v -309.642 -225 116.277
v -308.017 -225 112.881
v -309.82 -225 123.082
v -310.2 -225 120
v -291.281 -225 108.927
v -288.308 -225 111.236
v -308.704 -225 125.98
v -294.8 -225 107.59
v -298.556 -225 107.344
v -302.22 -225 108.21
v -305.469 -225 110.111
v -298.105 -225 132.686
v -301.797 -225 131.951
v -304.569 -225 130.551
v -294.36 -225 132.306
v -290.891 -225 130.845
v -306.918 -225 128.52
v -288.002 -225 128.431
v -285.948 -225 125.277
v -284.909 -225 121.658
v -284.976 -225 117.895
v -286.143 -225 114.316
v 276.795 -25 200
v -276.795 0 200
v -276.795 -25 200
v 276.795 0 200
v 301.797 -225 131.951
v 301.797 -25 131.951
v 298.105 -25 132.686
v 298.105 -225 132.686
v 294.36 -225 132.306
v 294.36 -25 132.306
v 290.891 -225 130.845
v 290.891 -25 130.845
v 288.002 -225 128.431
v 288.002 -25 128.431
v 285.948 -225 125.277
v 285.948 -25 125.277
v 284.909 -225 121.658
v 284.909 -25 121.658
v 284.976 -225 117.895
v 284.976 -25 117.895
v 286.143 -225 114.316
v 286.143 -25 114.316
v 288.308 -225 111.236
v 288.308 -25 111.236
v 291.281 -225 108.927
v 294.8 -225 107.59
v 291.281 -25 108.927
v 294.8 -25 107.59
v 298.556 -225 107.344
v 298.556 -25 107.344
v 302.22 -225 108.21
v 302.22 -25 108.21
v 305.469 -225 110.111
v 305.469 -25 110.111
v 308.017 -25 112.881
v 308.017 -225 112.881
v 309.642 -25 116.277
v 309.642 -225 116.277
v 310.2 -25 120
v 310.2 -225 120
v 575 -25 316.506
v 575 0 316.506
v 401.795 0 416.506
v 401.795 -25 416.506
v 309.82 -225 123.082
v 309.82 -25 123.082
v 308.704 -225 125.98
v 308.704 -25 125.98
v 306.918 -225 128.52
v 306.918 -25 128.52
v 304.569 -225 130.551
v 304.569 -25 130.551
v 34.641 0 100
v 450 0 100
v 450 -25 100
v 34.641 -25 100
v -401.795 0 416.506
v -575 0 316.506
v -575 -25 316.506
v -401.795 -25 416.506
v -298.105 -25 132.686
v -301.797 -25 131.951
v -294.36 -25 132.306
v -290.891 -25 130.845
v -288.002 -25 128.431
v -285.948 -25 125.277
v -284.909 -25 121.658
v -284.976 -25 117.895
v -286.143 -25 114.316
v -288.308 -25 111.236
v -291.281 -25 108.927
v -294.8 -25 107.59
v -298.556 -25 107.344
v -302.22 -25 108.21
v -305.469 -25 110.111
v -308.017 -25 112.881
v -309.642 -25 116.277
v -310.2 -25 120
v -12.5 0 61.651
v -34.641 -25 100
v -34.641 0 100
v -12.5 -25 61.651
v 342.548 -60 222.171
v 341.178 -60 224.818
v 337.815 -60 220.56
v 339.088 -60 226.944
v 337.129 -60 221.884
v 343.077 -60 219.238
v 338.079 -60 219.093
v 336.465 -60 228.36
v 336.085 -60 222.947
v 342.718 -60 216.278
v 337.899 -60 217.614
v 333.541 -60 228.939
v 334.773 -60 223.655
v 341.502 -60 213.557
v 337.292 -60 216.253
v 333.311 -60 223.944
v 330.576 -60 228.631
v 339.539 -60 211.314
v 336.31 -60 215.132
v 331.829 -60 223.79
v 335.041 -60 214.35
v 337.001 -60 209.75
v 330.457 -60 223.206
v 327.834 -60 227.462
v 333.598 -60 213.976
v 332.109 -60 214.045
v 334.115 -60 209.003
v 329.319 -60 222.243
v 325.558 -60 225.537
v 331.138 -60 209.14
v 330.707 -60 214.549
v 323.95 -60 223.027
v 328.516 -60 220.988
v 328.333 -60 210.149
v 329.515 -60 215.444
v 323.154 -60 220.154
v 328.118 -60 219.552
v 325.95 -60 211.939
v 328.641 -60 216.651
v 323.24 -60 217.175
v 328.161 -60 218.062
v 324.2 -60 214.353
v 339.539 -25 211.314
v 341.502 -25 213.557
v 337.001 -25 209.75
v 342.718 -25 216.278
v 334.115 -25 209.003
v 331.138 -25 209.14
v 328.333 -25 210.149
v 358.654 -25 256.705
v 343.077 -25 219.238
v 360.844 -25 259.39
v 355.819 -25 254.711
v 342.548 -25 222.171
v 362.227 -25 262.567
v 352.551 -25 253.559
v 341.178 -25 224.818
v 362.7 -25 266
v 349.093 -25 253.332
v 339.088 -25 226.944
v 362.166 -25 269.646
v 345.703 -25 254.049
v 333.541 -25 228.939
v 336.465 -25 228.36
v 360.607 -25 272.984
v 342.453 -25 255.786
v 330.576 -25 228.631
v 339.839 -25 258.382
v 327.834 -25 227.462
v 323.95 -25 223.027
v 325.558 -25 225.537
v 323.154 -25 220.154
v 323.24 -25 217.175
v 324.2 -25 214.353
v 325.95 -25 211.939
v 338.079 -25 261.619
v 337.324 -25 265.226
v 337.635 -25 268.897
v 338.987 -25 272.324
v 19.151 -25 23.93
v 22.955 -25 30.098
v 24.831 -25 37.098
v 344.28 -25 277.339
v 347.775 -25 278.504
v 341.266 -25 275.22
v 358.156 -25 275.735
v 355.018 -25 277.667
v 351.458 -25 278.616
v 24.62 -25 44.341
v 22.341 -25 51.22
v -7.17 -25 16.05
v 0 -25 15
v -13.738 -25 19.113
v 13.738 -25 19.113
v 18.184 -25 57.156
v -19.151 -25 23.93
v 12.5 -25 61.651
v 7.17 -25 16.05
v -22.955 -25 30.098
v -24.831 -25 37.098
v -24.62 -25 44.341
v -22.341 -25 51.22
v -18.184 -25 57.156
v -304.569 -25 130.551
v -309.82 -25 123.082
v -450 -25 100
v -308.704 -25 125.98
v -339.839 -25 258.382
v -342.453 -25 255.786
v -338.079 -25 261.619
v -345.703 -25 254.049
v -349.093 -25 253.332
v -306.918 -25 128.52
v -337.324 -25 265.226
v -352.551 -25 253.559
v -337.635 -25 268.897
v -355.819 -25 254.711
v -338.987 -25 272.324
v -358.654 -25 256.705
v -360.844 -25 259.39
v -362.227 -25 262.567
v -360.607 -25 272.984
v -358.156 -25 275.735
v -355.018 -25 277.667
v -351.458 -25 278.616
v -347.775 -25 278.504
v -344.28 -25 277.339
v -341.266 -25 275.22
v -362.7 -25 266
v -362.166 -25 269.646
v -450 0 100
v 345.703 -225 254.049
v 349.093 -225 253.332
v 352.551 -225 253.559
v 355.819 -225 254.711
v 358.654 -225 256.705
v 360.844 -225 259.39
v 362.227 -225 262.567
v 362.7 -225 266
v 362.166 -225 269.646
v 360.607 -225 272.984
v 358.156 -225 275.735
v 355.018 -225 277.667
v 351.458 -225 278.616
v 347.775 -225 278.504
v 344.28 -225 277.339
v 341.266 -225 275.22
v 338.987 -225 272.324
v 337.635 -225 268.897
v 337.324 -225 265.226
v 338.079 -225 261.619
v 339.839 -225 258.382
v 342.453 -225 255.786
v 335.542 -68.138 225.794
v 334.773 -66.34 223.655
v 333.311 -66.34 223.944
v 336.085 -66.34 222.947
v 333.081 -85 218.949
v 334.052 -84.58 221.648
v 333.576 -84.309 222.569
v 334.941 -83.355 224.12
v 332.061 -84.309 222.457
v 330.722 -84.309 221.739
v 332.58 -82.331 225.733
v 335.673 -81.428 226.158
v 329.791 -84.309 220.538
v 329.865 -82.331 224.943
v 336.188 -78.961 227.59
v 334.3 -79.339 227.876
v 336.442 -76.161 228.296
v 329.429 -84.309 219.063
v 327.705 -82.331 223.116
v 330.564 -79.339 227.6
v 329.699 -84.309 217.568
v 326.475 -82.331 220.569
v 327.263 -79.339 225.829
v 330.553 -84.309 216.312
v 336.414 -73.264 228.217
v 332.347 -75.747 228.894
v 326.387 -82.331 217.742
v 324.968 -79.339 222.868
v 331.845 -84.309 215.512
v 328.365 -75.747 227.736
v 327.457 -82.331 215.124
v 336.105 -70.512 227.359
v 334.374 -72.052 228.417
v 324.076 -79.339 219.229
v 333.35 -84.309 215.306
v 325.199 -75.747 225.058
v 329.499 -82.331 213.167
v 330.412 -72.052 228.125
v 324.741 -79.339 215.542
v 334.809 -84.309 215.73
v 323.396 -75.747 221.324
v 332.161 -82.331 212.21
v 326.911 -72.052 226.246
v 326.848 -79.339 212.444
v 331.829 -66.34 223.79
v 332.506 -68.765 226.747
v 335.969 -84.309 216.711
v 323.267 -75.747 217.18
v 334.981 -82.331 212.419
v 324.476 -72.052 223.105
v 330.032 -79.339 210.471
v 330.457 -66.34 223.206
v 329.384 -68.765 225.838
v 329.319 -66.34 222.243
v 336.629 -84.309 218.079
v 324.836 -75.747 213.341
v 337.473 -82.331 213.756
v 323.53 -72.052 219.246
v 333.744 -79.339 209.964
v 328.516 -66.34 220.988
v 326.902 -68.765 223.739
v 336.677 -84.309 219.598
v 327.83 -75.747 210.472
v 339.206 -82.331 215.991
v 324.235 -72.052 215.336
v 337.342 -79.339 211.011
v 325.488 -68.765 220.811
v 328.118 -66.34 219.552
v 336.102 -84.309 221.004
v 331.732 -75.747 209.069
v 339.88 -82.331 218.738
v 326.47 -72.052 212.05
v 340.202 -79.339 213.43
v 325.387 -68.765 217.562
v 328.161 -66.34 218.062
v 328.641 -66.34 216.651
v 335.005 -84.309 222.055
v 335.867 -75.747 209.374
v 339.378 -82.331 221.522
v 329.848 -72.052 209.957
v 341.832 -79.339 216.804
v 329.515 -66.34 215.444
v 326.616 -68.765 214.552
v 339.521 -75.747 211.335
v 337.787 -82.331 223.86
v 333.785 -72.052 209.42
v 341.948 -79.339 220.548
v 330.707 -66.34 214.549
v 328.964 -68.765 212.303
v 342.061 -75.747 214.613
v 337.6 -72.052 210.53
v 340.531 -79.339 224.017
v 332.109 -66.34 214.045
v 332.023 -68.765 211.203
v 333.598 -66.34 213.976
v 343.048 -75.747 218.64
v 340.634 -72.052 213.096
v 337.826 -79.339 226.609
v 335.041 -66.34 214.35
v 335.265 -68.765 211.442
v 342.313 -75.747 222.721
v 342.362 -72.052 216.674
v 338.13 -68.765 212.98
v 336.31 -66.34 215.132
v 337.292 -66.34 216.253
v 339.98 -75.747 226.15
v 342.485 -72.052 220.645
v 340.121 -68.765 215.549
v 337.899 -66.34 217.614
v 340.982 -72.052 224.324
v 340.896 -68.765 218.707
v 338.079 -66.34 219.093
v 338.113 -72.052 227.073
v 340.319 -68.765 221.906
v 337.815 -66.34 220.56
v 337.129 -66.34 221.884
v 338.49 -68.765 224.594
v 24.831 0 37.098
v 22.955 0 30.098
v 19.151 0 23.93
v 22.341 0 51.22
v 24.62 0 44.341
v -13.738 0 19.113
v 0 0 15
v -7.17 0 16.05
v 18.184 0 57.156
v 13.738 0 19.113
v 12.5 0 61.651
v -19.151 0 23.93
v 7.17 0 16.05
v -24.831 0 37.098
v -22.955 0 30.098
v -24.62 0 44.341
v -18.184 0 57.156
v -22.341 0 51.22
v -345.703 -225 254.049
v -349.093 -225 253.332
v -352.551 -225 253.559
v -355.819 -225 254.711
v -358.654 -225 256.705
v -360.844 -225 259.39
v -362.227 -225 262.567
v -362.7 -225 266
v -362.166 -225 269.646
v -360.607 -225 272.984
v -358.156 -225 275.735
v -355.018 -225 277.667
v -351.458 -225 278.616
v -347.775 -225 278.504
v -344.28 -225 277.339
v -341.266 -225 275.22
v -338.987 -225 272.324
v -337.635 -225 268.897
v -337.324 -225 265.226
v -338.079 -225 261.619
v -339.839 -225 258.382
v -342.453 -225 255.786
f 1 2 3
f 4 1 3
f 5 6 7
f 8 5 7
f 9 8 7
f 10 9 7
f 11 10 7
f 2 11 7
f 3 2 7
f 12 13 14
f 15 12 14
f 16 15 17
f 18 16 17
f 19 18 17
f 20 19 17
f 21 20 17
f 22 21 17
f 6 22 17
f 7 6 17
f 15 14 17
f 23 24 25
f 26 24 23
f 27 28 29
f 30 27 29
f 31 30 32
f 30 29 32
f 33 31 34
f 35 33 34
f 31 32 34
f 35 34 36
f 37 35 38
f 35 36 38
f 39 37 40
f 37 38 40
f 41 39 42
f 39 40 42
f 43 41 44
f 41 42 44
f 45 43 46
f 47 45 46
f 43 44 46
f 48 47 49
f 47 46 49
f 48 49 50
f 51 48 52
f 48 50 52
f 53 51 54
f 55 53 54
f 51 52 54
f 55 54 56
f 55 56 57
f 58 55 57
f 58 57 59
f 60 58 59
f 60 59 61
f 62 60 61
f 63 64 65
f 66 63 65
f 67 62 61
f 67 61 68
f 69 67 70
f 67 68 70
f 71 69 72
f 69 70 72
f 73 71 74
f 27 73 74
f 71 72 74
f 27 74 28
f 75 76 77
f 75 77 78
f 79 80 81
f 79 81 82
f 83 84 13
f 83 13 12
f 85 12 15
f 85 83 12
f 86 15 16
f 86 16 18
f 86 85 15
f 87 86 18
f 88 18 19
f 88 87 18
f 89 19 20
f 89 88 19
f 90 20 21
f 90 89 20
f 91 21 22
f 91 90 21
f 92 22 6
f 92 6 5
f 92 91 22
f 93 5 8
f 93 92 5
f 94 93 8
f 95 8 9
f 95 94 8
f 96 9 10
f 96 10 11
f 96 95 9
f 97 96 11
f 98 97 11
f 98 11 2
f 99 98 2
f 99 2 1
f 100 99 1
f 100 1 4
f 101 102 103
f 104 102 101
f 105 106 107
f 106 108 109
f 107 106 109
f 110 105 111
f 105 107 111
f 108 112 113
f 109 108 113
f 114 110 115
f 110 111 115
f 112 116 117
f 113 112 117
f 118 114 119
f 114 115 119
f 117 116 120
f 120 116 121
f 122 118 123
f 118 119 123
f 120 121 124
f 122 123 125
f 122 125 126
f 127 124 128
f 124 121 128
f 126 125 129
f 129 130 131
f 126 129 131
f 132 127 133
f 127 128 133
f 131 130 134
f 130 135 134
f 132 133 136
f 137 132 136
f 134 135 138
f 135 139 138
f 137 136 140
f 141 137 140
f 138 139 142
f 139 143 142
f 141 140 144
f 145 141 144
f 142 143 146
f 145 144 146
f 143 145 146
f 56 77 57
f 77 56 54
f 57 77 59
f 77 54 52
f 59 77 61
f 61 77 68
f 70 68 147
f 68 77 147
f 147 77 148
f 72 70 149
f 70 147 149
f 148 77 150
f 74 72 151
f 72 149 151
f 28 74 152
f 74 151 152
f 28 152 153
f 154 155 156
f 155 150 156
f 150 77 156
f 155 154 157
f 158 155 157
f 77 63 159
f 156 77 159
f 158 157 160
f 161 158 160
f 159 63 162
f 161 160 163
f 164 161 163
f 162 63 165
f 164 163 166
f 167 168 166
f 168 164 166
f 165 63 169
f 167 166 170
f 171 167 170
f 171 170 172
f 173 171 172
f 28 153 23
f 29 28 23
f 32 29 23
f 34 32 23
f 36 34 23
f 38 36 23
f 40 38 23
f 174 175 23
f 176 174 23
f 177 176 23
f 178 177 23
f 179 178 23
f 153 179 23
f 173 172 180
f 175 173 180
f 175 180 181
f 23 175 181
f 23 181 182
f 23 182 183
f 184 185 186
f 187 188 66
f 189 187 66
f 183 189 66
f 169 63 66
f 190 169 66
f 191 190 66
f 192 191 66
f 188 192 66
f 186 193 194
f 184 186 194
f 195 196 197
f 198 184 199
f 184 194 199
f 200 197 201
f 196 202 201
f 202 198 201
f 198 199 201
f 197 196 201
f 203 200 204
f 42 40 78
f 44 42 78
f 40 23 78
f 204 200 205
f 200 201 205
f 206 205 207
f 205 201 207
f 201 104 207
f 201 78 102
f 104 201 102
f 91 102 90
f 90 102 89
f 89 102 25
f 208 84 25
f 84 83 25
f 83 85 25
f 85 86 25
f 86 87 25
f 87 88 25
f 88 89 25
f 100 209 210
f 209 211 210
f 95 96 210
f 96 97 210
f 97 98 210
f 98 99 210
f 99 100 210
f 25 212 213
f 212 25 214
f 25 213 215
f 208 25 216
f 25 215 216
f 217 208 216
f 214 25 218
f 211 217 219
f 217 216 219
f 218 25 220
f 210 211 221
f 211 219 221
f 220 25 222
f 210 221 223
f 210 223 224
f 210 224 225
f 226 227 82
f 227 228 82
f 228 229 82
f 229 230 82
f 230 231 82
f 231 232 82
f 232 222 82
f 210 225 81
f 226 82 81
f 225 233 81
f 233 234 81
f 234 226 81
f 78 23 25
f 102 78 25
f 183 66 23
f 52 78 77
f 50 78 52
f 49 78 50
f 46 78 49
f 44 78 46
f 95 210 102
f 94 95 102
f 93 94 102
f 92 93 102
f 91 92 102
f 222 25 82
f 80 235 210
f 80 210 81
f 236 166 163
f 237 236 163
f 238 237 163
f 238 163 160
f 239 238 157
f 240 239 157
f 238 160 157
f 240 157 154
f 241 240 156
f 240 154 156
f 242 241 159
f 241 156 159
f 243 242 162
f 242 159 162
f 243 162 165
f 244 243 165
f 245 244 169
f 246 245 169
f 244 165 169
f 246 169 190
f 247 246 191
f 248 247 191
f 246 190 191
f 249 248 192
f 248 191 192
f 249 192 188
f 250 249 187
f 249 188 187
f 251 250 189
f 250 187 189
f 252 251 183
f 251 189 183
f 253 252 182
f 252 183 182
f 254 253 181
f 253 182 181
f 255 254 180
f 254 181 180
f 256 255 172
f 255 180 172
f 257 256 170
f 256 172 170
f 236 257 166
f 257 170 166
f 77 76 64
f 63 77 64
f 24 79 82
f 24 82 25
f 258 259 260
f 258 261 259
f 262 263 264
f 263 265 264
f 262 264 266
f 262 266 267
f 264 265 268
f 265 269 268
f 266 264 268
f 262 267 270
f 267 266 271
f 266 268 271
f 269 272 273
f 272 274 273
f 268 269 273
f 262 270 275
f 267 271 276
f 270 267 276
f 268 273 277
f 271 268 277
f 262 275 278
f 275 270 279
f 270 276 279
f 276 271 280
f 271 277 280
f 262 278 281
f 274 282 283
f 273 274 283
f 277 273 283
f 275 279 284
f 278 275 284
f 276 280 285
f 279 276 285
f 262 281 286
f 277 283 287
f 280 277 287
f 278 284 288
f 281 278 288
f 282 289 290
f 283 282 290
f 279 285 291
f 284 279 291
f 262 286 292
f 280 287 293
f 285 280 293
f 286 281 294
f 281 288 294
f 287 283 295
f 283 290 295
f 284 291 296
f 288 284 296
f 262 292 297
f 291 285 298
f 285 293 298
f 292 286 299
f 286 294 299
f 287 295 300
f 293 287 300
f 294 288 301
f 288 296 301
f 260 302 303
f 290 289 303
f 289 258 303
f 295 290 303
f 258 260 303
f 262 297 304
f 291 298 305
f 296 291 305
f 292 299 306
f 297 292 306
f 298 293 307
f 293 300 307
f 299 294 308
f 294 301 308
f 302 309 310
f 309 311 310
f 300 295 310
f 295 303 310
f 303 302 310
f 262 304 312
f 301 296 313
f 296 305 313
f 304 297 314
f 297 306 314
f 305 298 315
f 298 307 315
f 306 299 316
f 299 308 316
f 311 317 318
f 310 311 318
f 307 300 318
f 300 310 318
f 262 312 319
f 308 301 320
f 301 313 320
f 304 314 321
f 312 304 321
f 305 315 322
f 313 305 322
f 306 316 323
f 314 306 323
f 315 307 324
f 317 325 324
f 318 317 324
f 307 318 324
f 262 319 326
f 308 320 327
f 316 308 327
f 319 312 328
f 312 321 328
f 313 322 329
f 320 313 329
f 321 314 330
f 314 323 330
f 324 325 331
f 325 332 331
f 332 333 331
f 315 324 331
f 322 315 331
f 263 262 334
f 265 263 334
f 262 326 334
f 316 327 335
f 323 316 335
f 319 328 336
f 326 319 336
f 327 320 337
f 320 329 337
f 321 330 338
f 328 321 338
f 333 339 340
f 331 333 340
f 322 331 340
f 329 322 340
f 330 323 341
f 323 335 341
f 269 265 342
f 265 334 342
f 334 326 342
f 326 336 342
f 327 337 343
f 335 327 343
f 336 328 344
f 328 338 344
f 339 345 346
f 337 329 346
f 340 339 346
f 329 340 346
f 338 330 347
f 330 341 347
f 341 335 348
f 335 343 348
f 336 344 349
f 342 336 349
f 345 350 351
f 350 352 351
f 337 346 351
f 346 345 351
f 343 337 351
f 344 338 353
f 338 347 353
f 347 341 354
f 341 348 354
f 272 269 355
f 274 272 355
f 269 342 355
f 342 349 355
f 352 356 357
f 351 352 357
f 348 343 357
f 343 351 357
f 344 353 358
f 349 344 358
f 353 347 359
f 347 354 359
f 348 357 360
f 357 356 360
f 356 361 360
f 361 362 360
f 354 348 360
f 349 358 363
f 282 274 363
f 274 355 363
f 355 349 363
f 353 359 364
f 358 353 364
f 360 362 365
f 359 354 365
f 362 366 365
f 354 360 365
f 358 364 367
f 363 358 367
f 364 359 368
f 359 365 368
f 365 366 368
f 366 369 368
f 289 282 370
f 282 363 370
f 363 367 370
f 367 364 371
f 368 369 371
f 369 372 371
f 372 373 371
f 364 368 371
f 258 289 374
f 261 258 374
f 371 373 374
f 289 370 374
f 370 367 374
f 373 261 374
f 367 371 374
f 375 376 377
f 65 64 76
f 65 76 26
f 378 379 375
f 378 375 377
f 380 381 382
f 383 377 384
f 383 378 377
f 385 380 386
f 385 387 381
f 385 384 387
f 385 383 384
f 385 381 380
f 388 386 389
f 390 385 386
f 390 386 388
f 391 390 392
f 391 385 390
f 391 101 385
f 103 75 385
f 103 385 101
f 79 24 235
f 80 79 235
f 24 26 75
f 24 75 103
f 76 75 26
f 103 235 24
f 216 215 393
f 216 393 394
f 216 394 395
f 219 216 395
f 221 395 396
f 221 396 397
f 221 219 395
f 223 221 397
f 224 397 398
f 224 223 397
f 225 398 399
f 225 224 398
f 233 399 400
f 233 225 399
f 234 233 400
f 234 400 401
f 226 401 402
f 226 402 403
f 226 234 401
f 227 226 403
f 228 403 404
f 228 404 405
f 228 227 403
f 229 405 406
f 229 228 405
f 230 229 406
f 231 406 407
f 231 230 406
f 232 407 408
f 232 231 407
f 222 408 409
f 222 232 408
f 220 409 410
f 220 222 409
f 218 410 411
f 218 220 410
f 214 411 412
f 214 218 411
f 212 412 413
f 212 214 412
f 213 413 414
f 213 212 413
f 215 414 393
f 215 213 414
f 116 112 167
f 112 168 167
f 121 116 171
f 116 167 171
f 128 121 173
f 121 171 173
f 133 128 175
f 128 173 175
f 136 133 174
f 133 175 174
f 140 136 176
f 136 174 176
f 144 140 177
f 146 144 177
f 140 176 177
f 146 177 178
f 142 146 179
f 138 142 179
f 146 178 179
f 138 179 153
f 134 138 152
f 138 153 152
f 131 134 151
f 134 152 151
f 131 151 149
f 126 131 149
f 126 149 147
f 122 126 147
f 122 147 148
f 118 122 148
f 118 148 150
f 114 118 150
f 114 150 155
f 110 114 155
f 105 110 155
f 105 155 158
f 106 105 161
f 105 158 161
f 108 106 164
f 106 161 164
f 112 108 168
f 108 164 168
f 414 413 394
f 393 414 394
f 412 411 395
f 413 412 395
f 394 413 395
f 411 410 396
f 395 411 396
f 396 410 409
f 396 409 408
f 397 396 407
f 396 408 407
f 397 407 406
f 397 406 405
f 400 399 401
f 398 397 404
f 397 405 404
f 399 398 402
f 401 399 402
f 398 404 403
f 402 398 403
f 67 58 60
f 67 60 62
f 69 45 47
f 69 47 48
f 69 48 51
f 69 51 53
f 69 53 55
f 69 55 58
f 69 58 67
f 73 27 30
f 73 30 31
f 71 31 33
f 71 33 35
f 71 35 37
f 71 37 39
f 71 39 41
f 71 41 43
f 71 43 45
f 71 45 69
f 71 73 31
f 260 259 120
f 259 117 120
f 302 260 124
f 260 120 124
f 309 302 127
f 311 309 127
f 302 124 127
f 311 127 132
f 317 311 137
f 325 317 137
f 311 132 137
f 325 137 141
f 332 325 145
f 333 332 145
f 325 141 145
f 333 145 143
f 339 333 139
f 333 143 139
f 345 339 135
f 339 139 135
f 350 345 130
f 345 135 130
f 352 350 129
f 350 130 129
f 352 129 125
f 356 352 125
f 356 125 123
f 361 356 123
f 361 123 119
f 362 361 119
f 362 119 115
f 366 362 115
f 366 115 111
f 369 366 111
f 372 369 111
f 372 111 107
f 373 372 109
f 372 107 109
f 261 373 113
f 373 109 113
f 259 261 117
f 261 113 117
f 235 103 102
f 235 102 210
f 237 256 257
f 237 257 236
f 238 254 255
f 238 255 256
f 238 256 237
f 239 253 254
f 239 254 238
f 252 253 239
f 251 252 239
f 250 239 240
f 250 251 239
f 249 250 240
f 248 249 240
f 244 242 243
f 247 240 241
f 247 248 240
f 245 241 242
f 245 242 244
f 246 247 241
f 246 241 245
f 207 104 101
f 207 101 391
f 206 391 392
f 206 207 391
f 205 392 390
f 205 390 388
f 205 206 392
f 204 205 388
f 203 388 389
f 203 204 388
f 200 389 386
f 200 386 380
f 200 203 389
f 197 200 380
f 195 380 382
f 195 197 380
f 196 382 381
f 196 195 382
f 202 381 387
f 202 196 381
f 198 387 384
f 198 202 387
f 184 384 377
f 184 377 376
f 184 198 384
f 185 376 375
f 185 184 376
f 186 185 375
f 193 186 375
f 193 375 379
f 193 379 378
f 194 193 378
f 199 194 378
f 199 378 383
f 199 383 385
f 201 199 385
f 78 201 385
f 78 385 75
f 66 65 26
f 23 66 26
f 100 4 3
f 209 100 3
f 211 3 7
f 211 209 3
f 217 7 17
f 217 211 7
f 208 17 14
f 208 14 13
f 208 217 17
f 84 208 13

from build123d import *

# Parameters (mm, degrees)
F1_DEPTH = 25
F3_DEPTH = 200
F6_DEPTH = 25


with BuildPart() as f1:
    # F0 (on Front) → F1 (new body)
    with BuildSketch(Plane.XZ):
        Polygon((0, 200), (0, 100), (450, 100), (575, 316.5063509461), (401.7949192431, 416.5063509461), (276.7949192431, 200), align=None)
    extrude(amount=F1_DEPTH)

    # F2 (on face) → F3 (join)
    with BuildSketch(Plane.XZ.offset(25)):
        with BuildLine():
            ThreePointArc((345.7026108616, 254.0491654437), (357.30455878, 255.6108989307), (362.7, 266))
            ThreePointArc((362.7, 266), (342.69544122, 276.3891010693), (345.7026108616, 254.0491654437))
        make_face()
        with BuildLine():
            ThreePointArc((310.2, 120), (307.8891010693, 127.30455878), (301.7973891384, 131.9508345563))
            ThreePointArc((301.7973891384, 131.9508345563), (287.1108989307, 112.69544122), (310.2, 120))
        make_face()
    extrude(amount=F3_DEPTH)

    # F4: F1 across plane


with BuildPart() as f1_1:
    add(f1.part)
    add(f1.part.mirror(Plane.YZ))

    # F5 (on face) → F6 (join)
    with BuildSketch(Plane.XZ.offset(25)):
        with BuildLine():
            Line((-34.6410161514, 100), (-12.5, 61.6506350946))
            ThreePointArc((-12.5, 61.6506350946), (0, 15), (12.5, 61.6506350946))
            Line((12.5, 61.6506350946), (34.6410161514, 100))
            Line((34.6410161514, 100), (-34.6410161514, 100))
        make_face()
    extrude(amount=-F6_DEPTH)

    # F8 (on line) → F9 (revolve)
    with BuildSketch(Plane(origin=(225.2265575507, 0, -80.989001859), x_dir=(0, -1, 0), z_dir=(-0.941010595, 0, 0.3383770975))):
        with BuildLine():
            Line((25, 328.7408023961), (25, 318.7408023961))
            Line((25, 318.7408023961), (85, 318.7408023961))
            ThreePointArc((85, 318.7408023961), (77.588190451, 328.400060659), (66.3397459622, 323.7408023961))
            Line((66.3397459622, 323.7408023961), (60, 323.7408023961))
            Line((60, 323.7408023961), (60, 328.7408023961))
            Line((60, 328.7408023961), (25, 328.7408023961))
        make_face()
    revolve(axis=Axis((333.0811451244, -55, 218.9494702506), (0, -1, 0)))


solid = f1_1.part
